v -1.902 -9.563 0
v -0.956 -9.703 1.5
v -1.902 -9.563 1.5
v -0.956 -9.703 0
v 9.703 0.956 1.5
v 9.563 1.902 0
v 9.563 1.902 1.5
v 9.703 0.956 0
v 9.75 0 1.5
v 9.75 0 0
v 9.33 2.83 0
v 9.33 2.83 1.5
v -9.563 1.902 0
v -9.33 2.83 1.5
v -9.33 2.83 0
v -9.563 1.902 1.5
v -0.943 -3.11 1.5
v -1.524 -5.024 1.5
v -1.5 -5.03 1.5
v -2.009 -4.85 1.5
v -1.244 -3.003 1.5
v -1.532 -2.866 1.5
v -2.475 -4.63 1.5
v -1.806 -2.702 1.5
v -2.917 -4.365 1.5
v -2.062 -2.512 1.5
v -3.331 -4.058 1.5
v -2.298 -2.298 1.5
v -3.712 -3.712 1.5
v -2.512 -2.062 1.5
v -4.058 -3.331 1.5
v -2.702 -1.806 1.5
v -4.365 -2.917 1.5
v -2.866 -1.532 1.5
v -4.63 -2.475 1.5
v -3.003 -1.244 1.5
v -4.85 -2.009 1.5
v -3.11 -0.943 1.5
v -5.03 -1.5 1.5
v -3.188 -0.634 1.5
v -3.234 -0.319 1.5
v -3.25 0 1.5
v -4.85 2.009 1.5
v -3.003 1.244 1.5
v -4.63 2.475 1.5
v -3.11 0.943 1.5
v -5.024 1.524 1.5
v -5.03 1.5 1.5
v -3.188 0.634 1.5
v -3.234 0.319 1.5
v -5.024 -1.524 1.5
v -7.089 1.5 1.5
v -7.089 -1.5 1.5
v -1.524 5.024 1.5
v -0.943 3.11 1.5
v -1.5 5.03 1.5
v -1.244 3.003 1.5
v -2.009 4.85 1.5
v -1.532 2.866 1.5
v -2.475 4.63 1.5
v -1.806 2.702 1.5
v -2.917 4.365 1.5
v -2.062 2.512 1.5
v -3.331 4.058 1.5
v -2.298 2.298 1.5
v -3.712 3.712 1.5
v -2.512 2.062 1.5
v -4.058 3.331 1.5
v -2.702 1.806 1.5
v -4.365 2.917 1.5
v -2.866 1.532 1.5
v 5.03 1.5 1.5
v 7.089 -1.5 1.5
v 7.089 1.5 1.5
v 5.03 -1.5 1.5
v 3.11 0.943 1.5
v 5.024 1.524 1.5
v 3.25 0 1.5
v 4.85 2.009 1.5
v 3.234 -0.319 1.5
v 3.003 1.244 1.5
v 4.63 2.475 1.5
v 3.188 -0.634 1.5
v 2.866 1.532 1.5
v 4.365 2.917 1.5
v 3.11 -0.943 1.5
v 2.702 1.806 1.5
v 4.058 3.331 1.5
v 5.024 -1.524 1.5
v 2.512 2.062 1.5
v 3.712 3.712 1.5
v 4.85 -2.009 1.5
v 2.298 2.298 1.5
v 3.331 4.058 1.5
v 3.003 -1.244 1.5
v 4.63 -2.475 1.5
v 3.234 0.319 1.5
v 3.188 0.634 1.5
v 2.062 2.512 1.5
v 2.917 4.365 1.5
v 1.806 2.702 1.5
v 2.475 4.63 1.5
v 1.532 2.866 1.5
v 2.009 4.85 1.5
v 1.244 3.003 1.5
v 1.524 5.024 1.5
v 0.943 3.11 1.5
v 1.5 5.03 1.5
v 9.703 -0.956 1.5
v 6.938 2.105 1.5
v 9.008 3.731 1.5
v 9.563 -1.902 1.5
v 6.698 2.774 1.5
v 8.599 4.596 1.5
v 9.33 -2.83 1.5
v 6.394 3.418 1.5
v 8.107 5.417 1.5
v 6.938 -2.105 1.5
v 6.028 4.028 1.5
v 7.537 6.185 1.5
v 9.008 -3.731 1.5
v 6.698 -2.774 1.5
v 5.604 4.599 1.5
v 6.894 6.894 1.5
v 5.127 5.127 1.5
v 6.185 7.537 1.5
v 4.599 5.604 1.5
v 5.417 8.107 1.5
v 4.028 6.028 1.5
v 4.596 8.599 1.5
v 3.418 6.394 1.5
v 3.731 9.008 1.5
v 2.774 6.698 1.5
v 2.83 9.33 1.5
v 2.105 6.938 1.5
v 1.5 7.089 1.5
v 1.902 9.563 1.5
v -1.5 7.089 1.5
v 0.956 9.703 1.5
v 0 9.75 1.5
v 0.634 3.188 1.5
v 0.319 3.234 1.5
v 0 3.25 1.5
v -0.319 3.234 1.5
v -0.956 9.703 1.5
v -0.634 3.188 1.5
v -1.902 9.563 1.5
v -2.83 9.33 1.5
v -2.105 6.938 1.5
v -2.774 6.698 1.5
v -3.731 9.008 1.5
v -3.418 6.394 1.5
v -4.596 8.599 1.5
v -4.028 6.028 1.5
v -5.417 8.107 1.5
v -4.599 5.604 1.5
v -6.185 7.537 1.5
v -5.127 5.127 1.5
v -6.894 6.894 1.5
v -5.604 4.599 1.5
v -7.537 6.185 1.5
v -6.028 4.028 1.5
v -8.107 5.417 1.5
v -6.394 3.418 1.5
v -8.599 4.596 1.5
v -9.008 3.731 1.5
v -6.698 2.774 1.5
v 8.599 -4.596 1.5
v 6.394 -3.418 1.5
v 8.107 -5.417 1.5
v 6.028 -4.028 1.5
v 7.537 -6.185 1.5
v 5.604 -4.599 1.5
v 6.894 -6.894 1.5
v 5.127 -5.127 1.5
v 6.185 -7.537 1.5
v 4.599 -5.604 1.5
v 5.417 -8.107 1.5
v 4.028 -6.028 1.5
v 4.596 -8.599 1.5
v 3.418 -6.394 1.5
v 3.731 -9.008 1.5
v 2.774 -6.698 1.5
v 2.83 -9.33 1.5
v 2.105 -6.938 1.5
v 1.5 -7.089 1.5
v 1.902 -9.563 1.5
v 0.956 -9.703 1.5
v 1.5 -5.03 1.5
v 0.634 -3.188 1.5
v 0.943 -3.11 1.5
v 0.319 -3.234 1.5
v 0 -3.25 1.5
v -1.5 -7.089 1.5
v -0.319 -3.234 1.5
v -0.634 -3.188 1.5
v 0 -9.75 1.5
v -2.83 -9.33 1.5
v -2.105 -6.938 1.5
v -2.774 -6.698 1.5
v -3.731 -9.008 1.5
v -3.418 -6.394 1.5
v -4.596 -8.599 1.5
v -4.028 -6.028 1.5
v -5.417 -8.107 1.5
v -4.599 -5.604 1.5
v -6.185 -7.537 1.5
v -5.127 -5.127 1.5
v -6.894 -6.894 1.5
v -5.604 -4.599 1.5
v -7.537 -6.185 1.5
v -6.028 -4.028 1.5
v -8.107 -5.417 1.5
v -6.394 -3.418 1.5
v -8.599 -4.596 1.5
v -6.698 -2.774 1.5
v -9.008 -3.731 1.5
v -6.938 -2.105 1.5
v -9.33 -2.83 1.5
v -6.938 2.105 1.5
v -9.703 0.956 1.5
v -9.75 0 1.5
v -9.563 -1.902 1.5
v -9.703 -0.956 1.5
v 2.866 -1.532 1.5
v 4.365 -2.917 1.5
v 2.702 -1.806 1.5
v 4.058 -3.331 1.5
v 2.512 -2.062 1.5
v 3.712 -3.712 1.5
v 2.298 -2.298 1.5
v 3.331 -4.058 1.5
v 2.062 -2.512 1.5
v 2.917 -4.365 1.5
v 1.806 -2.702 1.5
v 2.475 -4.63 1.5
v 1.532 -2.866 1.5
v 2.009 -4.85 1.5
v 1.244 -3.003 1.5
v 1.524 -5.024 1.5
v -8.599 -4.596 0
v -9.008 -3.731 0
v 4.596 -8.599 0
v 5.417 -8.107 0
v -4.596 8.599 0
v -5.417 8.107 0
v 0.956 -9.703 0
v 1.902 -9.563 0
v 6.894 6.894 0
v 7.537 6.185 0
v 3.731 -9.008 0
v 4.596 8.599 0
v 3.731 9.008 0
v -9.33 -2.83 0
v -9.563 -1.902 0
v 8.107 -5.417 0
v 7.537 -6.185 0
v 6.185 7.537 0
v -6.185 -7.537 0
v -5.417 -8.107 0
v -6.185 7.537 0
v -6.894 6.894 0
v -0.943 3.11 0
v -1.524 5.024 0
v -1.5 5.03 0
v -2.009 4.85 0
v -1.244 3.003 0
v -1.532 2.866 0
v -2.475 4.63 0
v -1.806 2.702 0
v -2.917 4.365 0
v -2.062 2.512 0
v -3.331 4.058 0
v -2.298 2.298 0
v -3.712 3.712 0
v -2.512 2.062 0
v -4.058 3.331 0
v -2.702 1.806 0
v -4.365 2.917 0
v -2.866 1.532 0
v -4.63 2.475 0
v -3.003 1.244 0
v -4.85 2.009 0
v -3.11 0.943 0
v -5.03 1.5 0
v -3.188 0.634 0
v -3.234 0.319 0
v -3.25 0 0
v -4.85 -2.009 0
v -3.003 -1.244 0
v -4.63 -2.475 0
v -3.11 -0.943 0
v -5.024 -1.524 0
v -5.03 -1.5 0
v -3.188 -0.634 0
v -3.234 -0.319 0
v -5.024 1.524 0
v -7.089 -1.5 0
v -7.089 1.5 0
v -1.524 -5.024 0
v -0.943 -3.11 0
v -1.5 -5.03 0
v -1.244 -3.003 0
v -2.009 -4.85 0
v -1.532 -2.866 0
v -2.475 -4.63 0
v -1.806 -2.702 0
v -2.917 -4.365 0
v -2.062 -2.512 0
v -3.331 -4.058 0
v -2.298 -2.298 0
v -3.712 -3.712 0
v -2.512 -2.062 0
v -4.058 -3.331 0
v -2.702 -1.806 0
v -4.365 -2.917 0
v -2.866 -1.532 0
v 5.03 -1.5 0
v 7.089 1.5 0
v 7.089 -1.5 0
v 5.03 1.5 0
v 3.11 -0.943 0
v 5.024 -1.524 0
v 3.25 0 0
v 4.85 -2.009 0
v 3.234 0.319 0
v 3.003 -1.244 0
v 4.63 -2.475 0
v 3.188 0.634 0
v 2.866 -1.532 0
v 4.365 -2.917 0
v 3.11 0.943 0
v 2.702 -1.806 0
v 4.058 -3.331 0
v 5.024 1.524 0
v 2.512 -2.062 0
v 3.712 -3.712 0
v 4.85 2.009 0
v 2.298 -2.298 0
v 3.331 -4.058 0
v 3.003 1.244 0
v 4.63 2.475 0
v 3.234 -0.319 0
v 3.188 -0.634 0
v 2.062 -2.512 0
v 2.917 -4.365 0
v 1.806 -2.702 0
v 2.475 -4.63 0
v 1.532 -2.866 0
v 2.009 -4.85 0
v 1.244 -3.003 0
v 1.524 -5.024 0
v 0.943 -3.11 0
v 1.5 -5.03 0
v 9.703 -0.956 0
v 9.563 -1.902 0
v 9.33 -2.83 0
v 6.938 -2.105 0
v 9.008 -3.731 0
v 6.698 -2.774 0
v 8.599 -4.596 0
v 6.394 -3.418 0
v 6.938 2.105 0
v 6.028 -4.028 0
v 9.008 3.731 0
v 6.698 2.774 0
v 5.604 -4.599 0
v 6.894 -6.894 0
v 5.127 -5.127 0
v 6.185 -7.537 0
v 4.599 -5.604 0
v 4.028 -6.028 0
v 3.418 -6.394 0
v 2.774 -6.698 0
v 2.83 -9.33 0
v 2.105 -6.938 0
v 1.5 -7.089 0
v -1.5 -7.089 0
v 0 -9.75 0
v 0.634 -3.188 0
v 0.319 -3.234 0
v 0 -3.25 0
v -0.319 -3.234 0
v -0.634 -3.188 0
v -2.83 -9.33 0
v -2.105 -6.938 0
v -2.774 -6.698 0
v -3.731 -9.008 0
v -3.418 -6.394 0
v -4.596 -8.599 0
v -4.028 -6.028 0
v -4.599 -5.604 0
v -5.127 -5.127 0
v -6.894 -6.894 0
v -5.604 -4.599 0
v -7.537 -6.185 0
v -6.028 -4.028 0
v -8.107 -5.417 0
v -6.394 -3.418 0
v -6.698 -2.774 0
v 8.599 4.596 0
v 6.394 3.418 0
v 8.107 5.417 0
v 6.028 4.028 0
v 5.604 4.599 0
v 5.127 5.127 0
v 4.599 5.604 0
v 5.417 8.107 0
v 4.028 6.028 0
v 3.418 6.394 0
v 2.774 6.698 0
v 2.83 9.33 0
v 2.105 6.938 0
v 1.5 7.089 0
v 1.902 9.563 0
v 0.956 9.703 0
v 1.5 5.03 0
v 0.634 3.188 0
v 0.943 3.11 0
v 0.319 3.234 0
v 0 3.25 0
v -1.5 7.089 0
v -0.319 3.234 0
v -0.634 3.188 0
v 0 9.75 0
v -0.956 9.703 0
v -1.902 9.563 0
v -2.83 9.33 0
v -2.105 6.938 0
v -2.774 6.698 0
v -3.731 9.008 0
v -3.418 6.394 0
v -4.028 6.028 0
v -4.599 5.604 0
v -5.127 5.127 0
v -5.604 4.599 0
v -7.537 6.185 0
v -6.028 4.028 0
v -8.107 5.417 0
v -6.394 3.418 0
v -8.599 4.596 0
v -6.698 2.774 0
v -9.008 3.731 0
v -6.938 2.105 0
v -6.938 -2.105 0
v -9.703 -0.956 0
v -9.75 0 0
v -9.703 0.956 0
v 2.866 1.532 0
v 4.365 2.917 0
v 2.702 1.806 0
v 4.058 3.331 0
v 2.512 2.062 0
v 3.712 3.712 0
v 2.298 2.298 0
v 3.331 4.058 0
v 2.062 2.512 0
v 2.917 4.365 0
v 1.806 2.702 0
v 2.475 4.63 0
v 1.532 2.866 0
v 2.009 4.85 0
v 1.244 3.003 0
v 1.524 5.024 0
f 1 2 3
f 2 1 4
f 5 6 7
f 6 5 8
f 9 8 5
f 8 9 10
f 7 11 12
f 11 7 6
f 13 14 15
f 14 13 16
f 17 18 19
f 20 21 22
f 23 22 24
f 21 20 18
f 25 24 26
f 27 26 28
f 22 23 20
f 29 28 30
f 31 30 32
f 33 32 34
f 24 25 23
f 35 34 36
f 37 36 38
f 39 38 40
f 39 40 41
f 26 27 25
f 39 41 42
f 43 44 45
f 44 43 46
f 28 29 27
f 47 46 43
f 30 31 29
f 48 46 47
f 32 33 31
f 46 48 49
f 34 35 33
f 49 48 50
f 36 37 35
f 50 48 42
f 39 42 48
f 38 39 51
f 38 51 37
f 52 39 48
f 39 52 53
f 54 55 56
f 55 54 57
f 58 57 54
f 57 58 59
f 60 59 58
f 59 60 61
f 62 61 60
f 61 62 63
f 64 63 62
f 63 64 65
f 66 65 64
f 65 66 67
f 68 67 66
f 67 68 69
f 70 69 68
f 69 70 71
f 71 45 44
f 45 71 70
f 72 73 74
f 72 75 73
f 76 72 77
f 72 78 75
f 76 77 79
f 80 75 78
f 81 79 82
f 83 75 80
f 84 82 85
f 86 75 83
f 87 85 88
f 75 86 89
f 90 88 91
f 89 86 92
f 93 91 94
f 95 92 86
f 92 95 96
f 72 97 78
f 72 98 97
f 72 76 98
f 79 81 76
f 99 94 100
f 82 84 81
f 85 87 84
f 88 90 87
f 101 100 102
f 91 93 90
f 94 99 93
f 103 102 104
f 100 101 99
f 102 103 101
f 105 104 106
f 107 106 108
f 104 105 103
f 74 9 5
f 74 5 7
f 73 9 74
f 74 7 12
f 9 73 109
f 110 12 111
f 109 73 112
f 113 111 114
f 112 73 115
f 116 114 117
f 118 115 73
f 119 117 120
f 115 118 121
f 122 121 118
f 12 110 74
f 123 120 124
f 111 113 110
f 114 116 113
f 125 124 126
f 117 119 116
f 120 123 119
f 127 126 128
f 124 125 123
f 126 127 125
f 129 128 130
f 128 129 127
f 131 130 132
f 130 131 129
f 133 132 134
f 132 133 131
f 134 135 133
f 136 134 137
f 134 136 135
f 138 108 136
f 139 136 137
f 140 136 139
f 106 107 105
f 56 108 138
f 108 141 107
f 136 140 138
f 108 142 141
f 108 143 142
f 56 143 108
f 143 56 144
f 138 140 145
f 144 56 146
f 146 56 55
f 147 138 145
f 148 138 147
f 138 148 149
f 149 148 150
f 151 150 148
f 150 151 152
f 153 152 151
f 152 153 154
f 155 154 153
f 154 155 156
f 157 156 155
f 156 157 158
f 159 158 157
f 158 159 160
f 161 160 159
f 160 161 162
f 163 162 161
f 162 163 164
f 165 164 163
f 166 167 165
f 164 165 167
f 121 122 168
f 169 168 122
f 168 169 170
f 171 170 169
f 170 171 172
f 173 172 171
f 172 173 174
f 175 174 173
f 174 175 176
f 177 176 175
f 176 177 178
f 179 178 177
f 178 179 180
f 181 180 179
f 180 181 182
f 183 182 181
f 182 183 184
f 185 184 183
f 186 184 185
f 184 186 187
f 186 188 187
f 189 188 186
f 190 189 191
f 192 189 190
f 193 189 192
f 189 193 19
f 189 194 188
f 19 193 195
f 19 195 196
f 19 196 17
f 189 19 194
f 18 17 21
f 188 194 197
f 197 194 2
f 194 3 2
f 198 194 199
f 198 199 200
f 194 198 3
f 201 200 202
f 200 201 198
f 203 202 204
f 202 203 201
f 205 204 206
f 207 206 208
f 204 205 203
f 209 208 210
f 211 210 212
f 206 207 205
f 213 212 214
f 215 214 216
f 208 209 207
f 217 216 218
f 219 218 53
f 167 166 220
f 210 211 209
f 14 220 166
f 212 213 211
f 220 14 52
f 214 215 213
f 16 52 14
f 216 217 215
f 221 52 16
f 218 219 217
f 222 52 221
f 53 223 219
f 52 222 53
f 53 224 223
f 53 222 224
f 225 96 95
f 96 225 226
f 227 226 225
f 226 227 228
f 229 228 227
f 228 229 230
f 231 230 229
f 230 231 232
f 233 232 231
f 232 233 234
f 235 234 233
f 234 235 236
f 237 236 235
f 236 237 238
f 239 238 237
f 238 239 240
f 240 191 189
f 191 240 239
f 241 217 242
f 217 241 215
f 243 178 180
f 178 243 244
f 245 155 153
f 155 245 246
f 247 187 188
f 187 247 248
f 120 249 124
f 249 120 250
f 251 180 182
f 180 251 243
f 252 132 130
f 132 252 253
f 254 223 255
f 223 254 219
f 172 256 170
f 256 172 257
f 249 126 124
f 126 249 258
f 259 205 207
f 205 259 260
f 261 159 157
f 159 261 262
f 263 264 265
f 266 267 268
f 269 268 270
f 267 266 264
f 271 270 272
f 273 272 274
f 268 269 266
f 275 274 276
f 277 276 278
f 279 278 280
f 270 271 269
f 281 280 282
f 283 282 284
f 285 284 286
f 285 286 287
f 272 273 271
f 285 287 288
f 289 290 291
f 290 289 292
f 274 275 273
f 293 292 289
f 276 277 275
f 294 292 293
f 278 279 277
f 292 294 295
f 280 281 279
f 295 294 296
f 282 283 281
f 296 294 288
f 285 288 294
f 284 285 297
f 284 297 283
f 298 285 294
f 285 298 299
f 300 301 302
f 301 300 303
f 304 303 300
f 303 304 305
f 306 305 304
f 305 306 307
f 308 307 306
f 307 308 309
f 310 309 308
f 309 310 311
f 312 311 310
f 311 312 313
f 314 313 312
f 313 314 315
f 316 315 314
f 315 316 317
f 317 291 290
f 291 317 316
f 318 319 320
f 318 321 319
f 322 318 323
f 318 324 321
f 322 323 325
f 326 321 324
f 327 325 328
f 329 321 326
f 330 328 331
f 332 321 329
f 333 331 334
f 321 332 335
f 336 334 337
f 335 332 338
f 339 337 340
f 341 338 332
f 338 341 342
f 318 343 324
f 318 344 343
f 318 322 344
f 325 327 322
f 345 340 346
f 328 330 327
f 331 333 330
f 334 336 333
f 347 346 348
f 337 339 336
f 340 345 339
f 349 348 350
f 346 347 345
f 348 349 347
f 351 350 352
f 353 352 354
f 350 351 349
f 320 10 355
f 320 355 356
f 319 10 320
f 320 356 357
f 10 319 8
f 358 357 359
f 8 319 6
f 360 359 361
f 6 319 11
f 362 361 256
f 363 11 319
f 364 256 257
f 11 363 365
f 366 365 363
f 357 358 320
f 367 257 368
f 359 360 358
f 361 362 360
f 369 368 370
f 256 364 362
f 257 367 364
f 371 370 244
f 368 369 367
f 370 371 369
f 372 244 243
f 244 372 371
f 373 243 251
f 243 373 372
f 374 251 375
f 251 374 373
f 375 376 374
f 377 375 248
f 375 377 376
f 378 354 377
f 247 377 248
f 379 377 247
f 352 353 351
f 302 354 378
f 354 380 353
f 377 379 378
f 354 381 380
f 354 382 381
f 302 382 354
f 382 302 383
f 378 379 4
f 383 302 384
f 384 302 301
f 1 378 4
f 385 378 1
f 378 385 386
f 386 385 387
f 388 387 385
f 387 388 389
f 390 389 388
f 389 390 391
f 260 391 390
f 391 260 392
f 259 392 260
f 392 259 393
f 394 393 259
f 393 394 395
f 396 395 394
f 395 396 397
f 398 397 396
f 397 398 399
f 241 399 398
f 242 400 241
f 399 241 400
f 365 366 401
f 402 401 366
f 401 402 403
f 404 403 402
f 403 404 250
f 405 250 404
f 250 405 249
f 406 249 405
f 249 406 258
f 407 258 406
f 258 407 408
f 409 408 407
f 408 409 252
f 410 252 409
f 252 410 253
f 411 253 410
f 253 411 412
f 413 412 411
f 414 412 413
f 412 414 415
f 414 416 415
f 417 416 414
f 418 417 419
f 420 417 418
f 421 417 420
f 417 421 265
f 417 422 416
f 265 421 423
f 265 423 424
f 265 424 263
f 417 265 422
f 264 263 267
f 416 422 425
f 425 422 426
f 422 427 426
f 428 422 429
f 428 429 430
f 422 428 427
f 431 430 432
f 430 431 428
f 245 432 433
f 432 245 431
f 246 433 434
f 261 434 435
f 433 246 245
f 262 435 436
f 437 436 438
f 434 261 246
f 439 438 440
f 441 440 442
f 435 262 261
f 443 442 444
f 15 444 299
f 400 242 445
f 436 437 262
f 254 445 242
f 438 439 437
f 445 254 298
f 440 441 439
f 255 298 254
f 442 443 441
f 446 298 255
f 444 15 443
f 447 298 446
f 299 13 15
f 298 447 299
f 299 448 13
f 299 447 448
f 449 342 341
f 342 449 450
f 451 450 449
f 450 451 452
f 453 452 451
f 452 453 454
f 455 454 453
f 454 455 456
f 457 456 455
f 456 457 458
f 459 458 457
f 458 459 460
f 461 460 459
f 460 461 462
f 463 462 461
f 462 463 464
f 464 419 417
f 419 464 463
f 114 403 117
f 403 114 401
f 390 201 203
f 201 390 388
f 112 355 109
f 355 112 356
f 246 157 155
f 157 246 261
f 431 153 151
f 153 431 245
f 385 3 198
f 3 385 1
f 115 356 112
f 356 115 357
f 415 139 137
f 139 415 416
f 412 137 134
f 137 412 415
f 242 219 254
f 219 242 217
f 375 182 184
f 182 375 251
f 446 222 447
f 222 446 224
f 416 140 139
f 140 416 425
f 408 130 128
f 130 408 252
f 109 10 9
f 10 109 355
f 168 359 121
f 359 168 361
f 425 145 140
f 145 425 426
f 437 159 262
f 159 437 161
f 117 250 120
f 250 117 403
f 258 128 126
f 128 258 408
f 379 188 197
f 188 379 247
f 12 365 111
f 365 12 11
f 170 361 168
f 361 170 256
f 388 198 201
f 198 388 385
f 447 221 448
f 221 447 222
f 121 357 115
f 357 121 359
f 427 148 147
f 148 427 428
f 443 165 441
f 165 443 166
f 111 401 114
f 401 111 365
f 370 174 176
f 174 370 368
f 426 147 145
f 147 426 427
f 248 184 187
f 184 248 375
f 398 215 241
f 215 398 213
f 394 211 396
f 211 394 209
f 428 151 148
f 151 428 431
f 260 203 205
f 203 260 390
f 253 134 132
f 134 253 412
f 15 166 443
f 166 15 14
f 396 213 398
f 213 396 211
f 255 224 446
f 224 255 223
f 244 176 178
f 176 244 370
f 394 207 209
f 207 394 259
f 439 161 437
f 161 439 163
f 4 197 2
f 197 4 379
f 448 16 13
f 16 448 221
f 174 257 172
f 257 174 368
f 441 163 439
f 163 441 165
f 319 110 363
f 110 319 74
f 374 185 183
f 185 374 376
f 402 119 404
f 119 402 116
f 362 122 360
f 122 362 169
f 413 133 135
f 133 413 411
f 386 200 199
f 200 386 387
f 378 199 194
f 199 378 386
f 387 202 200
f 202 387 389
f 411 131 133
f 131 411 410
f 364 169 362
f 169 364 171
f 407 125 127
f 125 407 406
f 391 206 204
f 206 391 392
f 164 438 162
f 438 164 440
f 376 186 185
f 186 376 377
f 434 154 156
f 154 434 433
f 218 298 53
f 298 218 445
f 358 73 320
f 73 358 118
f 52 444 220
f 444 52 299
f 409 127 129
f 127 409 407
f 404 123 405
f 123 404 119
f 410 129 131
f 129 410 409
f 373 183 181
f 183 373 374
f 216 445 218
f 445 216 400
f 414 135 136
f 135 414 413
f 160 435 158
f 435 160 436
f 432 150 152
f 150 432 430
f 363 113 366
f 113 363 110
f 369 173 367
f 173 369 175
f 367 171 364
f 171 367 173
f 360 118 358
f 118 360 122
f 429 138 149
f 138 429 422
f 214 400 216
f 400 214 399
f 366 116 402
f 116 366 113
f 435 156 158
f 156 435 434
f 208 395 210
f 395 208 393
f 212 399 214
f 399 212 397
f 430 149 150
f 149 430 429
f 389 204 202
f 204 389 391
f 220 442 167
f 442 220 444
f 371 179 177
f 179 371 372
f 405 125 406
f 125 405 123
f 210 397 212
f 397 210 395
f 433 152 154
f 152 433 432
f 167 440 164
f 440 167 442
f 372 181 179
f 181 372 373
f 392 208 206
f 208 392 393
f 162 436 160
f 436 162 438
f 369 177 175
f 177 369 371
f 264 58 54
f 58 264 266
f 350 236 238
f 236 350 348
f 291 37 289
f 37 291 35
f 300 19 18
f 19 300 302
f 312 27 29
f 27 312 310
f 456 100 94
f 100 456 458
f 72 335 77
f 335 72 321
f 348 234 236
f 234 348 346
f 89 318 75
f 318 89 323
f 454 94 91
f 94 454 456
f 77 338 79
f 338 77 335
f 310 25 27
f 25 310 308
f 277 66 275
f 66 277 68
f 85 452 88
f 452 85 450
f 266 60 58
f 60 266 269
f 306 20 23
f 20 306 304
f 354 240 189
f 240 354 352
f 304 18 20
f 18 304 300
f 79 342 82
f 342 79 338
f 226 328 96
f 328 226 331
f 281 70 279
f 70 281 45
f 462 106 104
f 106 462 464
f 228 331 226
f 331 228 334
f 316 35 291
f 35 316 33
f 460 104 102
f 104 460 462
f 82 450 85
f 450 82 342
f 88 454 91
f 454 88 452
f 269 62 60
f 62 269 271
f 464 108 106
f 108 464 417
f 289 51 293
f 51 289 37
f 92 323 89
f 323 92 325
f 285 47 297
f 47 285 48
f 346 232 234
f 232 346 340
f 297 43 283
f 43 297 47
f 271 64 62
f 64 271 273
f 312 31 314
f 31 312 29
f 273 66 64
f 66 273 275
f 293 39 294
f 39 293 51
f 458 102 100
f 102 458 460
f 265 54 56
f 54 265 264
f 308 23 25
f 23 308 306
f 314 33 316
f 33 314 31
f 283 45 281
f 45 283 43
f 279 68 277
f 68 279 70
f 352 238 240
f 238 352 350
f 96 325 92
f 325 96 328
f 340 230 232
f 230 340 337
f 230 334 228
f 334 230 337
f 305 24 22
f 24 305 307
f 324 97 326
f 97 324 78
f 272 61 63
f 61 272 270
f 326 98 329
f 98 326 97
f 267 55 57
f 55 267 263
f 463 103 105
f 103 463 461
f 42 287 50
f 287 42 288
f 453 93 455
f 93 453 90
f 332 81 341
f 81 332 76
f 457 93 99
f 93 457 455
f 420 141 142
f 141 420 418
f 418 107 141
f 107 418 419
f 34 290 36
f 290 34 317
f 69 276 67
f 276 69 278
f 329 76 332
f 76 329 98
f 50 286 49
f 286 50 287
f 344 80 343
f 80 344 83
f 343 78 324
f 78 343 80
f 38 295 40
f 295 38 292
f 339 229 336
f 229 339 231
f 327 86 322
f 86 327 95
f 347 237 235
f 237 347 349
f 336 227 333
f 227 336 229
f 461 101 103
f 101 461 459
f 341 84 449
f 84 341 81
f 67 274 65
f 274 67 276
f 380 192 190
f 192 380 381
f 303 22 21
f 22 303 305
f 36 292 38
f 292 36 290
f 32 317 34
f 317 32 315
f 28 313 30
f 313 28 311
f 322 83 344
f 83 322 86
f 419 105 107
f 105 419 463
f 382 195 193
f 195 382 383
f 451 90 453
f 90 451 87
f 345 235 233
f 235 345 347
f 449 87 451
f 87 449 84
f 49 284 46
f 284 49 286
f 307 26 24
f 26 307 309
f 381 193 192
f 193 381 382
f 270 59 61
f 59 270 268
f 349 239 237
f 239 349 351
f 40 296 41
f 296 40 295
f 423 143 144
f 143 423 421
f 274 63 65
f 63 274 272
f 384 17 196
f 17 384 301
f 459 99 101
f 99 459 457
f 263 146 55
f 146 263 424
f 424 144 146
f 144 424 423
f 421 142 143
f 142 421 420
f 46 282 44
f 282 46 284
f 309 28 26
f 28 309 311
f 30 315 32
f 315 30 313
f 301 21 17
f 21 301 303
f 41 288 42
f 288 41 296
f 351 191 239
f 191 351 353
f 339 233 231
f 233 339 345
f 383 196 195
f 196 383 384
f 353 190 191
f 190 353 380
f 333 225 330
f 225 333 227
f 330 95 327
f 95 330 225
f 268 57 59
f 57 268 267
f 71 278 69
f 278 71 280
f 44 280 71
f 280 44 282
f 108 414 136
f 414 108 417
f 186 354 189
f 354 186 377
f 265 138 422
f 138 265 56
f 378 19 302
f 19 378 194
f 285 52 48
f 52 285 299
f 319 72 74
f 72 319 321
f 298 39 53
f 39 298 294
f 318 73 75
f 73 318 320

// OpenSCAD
$fn=64;

t=1.5;
mainR=9.75;
mainHoleR=7.25;
centerRingR=5.25;
centerHoleR=3.25;

crossBarWidth=3;

// cylinder(r=mainR,h=t);

outerRing();
centerRing();
crossBar();
rotate([0,0,90]) crossBar();


module outerRing() {
  difference() {
    cylinder(r=mainR,h=t);
    translate([0,0,-0.1]) cylinder(r=mainHoleR,h=t+0.2);
  }
}

module centerRing() {
  difference() {
    cylinder(r=centerRingR,h=t);
    translate([0,0,-0.1]) cylinder(r=centerHoleR,h=t+0.2);
  }
}

module crossBar() {
  difference() {
    translate([-crossBarWidth/2,-mainHoleR,0]) cube([crossBarWidth,mainHoleR*2,t]);
    translate([0,0,-0.1]) cylinder(r=centerRingR,h=t+0.2);
  }
}
